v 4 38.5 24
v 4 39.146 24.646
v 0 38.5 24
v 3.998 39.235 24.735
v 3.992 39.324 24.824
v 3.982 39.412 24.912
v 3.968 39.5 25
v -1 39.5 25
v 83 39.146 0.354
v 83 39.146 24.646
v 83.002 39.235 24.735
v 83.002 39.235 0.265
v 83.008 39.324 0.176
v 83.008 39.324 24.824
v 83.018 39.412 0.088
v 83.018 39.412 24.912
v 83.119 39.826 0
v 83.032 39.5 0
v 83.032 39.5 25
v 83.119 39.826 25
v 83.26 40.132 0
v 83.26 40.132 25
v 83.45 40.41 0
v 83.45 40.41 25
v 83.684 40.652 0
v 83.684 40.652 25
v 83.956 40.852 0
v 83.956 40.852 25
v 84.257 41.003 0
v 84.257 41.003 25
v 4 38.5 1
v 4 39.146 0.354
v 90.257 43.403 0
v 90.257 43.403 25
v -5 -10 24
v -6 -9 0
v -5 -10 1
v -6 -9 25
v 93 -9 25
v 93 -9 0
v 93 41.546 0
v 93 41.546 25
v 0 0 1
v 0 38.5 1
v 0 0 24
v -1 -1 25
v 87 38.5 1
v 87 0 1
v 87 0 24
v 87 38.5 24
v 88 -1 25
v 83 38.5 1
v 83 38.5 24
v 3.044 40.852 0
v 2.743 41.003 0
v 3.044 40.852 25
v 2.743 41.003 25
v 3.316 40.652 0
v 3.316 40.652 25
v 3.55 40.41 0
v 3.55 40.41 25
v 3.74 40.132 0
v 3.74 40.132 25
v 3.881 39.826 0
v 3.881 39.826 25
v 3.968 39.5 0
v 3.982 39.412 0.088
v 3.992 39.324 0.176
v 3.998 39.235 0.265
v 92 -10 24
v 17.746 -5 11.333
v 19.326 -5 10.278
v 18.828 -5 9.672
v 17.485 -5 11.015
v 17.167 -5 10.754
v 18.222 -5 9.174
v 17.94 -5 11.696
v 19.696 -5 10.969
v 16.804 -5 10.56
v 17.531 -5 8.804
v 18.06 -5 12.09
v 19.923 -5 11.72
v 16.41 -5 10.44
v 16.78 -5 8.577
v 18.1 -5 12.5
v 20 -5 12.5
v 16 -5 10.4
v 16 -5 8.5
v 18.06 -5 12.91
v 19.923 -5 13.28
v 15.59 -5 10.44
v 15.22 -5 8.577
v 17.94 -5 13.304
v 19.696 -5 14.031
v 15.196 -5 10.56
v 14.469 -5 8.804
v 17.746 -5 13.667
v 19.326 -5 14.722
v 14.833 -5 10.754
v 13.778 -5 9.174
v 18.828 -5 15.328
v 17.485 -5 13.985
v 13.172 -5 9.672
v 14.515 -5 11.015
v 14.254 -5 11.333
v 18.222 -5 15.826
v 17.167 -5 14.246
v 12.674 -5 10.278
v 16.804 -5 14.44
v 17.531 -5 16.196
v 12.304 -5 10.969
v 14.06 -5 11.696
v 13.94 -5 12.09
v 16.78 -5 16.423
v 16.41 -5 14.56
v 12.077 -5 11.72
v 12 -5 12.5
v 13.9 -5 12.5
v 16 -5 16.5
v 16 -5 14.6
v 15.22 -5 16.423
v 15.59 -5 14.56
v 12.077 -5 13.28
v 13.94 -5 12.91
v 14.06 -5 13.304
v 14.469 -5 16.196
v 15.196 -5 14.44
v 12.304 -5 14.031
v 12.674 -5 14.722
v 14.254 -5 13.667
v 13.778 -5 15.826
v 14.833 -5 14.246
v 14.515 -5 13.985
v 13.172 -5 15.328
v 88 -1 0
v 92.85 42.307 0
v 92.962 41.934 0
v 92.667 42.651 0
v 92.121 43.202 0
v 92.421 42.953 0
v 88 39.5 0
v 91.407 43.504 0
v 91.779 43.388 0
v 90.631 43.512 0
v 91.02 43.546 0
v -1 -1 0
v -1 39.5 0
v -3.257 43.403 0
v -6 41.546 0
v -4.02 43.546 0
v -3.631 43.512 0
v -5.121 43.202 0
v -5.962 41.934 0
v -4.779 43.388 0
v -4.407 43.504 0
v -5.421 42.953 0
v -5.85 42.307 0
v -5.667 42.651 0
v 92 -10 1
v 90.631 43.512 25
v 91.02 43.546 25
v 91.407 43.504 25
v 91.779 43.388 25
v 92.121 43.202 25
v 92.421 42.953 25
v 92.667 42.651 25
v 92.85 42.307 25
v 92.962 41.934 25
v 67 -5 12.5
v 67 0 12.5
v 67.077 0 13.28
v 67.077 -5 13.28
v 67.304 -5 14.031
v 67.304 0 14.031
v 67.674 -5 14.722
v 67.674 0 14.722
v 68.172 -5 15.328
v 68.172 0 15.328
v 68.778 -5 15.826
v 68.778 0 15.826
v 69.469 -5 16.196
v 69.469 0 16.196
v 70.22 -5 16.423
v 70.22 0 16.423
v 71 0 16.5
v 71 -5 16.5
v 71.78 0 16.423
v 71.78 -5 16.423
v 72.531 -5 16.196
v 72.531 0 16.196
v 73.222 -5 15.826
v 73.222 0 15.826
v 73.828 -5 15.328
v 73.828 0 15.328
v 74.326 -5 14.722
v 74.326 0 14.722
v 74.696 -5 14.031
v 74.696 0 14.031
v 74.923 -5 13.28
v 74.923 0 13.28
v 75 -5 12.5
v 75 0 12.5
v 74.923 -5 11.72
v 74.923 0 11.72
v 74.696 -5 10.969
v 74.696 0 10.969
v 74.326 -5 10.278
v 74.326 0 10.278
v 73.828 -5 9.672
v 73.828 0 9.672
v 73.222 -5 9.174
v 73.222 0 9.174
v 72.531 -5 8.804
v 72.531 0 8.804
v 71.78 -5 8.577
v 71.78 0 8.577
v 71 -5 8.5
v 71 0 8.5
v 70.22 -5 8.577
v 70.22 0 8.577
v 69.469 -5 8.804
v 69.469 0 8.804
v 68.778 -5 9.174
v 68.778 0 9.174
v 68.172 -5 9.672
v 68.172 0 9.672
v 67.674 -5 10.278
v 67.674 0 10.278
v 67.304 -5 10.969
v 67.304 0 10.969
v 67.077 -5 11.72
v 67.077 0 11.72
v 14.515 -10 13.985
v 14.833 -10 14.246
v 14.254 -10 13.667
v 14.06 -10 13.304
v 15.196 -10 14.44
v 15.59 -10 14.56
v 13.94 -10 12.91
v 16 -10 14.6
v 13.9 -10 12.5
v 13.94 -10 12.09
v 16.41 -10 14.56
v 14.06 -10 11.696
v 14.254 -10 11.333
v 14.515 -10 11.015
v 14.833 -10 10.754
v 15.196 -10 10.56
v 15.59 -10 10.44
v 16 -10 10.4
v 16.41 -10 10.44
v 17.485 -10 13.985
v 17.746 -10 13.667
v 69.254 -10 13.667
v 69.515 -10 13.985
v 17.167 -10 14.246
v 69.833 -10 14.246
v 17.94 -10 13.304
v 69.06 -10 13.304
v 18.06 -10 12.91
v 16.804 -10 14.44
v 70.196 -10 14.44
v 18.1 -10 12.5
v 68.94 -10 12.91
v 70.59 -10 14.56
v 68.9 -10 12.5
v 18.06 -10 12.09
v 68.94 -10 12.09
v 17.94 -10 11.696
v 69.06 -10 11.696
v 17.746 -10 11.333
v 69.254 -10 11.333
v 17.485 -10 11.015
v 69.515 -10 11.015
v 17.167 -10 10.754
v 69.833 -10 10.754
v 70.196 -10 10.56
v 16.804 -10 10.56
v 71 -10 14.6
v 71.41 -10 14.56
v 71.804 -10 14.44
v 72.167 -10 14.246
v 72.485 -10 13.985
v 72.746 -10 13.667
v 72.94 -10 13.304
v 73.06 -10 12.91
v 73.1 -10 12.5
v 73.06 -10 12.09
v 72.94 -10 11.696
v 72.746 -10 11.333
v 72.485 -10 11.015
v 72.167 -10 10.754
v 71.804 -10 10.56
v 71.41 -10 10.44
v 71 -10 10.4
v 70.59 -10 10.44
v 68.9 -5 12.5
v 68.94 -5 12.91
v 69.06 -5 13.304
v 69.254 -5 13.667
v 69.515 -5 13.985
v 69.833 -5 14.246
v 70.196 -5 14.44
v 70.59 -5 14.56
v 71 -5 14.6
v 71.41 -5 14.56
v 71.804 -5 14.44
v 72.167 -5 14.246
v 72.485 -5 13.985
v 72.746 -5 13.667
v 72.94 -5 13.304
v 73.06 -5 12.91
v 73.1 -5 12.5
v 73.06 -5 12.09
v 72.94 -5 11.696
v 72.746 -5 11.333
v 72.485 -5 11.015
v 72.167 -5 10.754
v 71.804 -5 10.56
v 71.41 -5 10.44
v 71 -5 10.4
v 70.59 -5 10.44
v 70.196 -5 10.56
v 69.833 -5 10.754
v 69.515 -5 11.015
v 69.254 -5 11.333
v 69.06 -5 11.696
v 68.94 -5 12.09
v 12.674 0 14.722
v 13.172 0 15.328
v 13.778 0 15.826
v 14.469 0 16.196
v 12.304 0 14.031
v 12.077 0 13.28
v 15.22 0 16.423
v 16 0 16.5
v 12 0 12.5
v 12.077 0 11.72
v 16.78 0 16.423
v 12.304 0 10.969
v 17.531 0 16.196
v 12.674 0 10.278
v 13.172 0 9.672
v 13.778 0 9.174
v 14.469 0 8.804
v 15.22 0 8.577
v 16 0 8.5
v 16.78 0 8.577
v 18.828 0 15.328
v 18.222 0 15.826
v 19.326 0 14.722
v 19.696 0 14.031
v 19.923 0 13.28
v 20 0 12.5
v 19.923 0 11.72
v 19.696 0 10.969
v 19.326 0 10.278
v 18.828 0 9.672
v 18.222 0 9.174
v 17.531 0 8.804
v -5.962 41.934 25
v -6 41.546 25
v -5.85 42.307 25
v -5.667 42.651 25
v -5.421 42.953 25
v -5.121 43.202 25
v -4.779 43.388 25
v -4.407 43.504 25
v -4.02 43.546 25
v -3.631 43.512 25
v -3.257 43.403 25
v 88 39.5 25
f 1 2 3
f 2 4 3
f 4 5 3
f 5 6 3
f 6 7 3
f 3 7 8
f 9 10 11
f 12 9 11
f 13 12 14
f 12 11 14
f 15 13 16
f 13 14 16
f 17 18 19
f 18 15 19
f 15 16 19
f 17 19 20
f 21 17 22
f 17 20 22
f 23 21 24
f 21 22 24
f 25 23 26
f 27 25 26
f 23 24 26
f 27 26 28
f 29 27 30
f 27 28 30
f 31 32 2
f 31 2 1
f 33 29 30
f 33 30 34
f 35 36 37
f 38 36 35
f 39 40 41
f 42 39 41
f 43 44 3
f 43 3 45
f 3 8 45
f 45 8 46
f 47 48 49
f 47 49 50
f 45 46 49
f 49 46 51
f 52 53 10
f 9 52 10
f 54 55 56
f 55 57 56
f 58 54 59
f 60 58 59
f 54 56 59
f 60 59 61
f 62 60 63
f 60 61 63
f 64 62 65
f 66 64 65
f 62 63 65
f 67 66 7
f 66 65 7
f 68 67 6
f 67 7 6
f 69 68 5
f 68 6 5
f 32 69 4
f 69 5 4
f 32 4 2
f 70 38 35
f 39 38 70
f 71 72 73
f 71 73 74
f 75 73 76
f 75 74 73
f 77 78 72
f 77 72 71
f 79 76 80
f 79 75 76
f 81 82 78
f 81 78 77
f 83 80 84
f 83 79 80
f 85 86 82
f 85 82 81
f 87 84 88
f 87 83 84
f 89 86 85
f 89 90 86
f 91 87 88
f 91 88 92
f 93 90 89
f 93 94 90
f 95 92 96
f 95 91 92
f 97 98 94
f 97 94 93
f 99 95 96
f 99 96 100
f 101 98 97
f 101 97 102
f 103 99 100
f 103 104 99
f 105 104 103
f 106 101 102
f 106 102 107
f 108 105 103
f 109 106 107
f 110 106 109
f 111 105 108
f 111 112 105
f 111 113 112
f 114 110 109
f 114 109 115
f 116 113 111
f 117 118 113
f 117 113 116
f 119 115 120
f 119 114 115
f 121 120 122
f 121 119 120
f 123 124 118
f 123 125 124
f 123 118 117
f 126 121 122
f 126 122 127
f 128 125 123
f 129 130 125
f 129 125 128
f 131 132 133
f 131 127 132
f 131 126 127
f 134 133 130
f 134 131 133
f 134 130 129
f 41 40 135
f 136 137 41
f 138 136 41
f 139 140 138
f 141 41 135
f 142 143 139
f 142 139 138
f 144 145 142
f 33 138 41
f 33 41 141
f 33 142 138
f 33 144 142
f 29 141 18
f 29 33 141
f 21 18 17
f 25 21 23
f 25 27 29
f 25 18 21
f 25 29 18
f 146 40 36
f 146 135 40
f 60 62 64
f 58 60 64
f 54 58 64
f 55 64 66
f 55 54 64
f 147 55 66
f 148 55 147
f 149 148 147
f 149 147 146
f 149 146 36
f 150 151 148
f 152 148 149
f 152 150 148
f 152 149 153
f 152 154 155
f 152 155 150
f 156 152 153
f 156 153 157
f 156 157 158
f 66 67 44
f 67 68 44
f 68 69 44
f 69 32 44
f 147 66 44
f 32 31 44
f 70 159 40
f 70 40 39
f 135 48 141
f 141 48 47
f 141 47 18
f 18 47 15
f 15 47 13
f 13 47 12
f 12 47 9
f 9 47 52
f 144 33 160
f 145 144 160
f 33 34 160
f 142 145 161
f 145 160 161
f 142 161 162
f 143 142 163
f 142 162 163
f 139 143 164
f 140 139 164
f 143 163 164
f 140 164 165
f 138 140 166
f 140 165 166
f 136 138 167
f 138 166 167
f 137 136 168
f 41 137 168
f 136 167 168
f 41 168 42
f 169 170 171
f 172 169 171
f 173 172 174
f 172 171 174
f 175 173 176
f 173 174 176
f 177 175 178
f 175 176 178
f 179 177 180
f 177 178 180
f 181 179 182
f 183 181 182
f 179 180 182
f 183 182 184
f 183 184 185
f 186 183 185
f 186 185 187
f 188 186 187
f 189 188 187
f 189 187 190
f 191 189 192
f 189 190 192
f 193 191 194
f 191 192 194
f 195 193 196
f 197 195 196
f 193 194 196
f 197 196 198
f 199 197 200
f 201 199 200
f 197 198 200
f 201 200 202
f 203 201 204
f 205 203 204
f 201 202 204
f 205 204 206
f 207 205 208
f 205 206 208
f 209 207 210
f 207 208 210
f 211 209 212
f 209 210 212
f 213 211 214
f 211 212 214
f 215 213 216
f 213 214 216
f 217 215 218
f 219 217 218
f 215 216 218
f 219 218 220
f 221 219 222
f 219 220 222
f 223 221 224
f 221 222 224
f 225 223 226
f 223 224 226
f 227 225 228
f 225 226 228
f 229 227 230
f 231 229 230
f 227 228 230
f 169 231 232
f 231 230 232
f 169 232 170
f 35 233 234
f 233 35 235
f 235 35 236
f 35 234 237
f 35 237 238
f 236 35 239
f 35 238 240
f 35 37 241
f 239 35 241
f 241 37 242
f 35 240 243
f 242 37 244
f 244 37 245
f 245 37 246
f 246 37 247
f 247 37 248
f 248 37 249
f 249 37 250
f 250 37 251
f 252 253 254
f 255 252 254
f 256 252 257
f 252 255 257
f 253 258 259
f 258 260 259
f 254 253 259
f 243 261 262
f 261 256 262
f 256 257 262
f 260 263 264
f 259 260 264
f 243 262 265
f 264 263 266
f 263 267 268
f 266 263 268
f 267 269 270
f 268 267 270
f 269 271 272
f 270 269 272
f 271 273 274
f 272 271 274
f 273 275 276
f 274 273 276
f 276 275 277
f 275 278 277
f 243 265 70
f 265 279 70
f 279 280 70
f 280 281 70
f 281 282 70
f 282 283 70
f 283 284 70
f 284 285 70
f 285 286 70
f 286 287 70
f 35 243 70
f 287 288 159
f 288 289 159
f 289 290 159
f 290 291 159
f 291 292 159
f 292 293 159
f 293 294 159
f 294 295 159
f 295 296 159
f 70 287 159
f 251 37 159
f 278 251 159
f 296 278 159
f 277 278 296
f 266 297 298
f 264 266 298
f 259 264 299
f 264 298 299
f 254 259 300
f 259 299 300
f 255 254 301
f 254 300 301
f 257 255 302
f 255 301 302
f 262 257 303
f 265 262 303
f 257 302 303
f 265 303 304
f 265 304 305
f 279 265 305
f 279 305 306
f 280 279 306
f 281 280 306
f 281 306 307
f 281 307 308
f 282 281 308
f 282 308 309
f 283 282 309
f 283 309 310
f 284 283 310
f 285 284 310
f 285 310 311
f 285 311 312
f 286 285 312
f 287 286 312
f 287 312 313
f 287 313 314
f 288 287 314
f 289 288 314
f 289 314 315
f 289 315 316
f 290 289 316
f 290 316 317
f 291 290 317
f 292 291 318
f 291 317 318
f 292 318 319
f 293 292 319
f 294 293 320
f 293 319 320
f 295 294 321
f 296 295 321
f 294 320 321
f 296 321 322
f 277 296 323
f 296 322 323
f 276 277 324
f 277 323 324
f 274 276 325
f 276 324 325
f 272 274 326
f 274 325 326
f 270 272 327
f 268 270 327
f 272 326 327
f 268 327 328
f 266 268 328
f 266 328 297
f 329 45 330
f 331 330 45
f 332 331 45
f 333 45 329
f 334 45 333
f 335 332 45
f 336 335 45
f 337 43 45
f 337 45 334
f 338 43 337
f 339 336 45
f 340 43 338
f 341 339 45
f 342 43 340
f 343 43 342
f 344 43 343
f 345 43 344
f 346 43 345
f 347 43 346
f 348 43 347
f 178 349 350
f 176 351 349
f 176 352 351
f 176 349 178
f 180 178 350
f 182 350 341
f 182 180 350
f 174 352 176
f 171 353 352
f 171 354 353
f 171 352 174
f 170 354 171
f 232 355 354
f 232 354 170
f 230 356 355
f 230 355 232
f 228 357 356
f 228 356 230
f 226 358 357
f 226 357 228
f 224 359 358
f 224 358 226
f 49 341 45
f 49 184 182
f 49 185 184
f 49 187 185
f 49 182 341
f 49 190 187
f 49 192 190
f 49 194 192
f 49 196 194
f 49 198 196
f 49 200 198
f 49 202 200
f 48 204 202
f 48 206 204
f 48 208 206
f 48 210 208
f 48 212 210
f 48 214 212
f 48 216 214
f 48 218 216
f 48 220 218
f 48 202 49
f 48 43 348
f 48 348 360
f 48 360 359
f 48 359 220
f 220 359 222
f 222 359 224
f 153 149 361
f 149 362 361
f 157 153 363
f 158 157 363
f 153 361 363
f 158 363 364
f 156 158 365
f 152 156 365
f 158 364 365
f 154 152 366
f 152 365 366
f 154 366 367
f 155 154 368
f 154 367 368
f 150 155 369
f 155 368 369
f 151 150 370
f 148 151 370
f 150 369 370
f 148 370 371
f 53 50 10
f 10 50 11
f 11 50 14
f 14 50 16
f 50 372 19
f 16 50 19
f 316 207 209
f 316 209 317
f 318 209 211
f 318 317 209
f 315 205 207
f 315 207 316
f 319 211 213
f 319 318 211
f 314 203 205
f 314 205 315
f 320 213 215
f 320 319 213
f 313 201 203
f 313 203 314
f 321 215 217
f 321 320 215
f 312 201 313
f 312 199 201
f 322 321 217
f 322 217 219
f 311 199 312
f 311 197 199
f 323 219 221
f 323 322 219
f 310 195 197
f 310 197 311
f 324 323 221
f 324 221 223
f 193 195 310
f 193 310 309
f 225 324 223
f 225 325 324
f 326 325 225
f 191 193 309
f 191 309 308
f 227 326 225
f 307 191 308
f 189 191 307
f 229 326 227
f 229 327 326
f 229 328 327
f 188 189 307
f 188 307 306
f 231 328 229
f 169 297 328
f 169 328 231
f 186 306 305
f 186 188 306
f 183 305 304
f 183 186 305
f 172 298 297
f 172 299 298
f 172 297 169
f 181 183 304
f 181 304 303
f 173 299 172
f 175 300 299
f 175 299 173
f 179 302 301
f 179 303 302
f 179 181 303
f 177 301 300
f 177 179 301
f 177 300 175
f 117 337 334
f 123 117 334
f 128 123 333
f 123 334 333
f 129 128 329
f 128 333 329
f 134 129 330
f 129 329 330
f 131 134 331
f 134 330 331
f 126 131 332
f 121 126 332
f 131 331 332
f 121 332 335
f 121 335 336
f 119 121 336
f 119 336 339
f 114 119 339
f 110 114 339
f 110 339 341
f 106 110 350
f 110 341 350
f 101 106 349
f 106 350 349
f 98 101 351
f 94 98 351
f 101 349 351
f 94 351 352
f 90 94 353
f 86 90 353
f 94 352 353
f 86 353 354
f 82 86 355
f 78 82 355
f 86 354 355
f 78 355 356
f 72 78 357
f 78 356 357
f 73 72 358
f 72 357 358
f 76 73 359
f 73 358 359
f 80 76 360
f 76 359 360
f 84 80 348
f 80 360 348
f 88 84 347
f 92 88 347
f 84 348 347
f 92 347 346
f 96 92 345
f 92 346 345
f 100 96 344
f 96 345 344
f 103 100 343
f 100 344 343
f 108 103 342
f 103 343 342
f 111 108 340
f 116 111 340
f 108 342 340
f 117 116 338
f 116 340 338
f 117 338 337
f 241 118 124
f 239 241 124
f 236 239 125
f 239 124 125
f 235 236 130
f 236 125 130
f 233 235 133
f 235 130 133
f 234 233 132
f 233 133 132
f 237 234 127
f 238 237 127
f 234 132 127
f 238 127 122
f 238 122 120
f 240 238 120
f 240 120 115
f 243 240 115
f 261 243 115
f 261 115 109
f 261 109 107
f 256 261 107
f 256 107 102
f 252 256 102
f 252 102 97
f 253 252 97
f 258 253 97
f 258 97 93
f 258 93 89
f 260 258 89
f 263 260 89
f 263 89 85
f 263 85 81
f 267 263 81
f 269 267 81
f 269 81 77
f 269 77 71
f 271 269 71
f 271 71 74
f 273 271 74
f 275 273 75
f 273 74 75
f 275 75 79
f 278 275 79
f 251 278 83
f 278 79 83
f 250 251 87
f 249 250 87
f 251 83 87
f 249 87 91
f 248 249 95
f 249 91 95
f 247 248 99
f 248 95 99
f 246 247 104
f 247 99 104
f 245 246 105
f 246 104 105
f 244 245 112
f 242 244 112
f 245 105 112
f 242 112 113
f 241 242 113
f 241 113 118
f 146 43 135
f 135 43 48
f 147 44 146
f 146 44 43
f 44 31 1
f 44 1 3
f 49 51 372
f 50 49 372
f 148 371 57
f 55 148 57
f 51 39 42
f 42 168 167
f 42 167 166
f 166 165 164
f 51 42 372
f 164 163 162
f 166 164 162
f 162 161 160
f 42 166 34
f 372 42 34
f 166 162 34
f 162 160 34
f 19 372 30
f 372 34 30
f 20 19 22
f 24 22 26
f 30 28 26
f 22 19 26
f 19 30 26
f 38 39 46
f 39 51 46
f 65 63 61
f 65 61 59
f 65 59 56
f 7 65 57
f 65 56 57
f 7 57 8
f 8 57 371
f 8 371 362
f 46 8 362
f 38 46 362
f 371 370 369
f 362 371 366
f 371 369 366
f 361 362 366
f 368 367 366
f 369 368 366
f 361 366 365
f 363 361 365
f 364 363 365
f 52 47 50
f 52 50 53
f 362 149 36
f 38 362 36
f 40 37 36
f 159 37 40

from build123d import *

# Parameters (mm, degrees)
BOSS_EXTRUDE1_DEPTH = 25
SKETCH3_R           = 2.1
CUT_EXTRUDE1_DEPTH  = 107.086049978
SKETCH3_3_R         = 4
SKETCH3_3_R_2       = 2.1
CUT_EXTRUDE2_DEPTH  = 5
FILLET1_R           = 2
CHAMFER1_SIZE       = 1


with BuildPart() as part:
    # Sketch2 → Boss-Extrude1 (new body)
    with BuildSketch(Plane.XY):
        Polygon((0, 0), (87, 0), (87, 38.5), (83, 38.5), (83, 40.5), (93, 44.5), (93, 38.5), (93, -10), (87, -10), (0, -10), (-6, -10), (-6, 38.5), (-6, 44.5), (4, 40.5), (4, 38.5), (0, 38.5), align=None)
    extrude(amount=BOSS_EXTRUDE1_DEPTH)

    # Sketch3 → Cut-Extrude1 (cut, through all)
    with BuildSketch(Plane(origin=(0, 0, 0), x_dir=(1, 0, 0), z_dir=(0, 1, 0))):
        with Locations((16, -12.5)):
            Circle(SKETCH3_R)
        with Locations((71, -12.5)):
            Circle(SKETCH3_R)
    extrude(amount=-CUT_EXTRUDE1_DEPTH, mode=Mode.SUBTRACT)

    # Sketch3<3> → Cut-Extrude2 (cut)
    # profile 1 of 2: a face of its own
    with BuildSketch(Plane(origin=(0, 0, 0), x_dir=(1, 0, 0), z_dir=(0, 1, 0))):
        with Locations((16, -12.5)):
            Circle(SKETCH3_3_R)
        with Locations((16, -12.5)):
            Circle(SKETCH3_3_R_2, mode=Mode.SUBTRACT)
    # profile 2 of 2: a face of its own
    with BuildSketch(Plane(origin=(0, 0, 0), x_dir=(1, 0, 0), z_dir=(0, 1, 0))):
        with Locations((71, -12.5)):
            Circle(SKETCH3_3_R)
        with Locations((71, -12.5)):
            Circle(SKETCH3_3_R_2, mode=Mode.SUBTRACT)
    extrude(amount=-CUT_EXTRUDE2_DEPTH, mode=Mode.SUBTRACT)

    # Fillet1
    fillet1_edges = [part.edges().sort_by_distance(p)[0] for p in [
        (-6, 44.5, 12.5),
        (93, 44.5, 12.5),
        (83, 40.5, 12.5),
        (4, 40.5, 12.5),
    ]]
    fillet(fillet1_edges, radius=FILLET1_R)

    # Chamfer1
    chamfer1_edges = [part.edges().sort_by_distance(p)[0] for p in [
        (2, 38.5, 25),
        (0, 19.25, 25),
        (85, 38.5, 25),
        (87, 19.25, 25),
        (43.5, 0, 25),
        (85, 38.5, 0),
        (87, 19.25, 0),
        (43.5, 0, 0),
        (2, 38.5, 0),
        (0, 19.25, 0),
        (93, -10, 12.5),
        (43.5, -10, 0),
        (-6, -10, 12.5),
        (43.5, -10, 25),
    ]]
    chamfer(chamfer1_edges, length=CHAMFER1_SIZE)


solid = part.part
